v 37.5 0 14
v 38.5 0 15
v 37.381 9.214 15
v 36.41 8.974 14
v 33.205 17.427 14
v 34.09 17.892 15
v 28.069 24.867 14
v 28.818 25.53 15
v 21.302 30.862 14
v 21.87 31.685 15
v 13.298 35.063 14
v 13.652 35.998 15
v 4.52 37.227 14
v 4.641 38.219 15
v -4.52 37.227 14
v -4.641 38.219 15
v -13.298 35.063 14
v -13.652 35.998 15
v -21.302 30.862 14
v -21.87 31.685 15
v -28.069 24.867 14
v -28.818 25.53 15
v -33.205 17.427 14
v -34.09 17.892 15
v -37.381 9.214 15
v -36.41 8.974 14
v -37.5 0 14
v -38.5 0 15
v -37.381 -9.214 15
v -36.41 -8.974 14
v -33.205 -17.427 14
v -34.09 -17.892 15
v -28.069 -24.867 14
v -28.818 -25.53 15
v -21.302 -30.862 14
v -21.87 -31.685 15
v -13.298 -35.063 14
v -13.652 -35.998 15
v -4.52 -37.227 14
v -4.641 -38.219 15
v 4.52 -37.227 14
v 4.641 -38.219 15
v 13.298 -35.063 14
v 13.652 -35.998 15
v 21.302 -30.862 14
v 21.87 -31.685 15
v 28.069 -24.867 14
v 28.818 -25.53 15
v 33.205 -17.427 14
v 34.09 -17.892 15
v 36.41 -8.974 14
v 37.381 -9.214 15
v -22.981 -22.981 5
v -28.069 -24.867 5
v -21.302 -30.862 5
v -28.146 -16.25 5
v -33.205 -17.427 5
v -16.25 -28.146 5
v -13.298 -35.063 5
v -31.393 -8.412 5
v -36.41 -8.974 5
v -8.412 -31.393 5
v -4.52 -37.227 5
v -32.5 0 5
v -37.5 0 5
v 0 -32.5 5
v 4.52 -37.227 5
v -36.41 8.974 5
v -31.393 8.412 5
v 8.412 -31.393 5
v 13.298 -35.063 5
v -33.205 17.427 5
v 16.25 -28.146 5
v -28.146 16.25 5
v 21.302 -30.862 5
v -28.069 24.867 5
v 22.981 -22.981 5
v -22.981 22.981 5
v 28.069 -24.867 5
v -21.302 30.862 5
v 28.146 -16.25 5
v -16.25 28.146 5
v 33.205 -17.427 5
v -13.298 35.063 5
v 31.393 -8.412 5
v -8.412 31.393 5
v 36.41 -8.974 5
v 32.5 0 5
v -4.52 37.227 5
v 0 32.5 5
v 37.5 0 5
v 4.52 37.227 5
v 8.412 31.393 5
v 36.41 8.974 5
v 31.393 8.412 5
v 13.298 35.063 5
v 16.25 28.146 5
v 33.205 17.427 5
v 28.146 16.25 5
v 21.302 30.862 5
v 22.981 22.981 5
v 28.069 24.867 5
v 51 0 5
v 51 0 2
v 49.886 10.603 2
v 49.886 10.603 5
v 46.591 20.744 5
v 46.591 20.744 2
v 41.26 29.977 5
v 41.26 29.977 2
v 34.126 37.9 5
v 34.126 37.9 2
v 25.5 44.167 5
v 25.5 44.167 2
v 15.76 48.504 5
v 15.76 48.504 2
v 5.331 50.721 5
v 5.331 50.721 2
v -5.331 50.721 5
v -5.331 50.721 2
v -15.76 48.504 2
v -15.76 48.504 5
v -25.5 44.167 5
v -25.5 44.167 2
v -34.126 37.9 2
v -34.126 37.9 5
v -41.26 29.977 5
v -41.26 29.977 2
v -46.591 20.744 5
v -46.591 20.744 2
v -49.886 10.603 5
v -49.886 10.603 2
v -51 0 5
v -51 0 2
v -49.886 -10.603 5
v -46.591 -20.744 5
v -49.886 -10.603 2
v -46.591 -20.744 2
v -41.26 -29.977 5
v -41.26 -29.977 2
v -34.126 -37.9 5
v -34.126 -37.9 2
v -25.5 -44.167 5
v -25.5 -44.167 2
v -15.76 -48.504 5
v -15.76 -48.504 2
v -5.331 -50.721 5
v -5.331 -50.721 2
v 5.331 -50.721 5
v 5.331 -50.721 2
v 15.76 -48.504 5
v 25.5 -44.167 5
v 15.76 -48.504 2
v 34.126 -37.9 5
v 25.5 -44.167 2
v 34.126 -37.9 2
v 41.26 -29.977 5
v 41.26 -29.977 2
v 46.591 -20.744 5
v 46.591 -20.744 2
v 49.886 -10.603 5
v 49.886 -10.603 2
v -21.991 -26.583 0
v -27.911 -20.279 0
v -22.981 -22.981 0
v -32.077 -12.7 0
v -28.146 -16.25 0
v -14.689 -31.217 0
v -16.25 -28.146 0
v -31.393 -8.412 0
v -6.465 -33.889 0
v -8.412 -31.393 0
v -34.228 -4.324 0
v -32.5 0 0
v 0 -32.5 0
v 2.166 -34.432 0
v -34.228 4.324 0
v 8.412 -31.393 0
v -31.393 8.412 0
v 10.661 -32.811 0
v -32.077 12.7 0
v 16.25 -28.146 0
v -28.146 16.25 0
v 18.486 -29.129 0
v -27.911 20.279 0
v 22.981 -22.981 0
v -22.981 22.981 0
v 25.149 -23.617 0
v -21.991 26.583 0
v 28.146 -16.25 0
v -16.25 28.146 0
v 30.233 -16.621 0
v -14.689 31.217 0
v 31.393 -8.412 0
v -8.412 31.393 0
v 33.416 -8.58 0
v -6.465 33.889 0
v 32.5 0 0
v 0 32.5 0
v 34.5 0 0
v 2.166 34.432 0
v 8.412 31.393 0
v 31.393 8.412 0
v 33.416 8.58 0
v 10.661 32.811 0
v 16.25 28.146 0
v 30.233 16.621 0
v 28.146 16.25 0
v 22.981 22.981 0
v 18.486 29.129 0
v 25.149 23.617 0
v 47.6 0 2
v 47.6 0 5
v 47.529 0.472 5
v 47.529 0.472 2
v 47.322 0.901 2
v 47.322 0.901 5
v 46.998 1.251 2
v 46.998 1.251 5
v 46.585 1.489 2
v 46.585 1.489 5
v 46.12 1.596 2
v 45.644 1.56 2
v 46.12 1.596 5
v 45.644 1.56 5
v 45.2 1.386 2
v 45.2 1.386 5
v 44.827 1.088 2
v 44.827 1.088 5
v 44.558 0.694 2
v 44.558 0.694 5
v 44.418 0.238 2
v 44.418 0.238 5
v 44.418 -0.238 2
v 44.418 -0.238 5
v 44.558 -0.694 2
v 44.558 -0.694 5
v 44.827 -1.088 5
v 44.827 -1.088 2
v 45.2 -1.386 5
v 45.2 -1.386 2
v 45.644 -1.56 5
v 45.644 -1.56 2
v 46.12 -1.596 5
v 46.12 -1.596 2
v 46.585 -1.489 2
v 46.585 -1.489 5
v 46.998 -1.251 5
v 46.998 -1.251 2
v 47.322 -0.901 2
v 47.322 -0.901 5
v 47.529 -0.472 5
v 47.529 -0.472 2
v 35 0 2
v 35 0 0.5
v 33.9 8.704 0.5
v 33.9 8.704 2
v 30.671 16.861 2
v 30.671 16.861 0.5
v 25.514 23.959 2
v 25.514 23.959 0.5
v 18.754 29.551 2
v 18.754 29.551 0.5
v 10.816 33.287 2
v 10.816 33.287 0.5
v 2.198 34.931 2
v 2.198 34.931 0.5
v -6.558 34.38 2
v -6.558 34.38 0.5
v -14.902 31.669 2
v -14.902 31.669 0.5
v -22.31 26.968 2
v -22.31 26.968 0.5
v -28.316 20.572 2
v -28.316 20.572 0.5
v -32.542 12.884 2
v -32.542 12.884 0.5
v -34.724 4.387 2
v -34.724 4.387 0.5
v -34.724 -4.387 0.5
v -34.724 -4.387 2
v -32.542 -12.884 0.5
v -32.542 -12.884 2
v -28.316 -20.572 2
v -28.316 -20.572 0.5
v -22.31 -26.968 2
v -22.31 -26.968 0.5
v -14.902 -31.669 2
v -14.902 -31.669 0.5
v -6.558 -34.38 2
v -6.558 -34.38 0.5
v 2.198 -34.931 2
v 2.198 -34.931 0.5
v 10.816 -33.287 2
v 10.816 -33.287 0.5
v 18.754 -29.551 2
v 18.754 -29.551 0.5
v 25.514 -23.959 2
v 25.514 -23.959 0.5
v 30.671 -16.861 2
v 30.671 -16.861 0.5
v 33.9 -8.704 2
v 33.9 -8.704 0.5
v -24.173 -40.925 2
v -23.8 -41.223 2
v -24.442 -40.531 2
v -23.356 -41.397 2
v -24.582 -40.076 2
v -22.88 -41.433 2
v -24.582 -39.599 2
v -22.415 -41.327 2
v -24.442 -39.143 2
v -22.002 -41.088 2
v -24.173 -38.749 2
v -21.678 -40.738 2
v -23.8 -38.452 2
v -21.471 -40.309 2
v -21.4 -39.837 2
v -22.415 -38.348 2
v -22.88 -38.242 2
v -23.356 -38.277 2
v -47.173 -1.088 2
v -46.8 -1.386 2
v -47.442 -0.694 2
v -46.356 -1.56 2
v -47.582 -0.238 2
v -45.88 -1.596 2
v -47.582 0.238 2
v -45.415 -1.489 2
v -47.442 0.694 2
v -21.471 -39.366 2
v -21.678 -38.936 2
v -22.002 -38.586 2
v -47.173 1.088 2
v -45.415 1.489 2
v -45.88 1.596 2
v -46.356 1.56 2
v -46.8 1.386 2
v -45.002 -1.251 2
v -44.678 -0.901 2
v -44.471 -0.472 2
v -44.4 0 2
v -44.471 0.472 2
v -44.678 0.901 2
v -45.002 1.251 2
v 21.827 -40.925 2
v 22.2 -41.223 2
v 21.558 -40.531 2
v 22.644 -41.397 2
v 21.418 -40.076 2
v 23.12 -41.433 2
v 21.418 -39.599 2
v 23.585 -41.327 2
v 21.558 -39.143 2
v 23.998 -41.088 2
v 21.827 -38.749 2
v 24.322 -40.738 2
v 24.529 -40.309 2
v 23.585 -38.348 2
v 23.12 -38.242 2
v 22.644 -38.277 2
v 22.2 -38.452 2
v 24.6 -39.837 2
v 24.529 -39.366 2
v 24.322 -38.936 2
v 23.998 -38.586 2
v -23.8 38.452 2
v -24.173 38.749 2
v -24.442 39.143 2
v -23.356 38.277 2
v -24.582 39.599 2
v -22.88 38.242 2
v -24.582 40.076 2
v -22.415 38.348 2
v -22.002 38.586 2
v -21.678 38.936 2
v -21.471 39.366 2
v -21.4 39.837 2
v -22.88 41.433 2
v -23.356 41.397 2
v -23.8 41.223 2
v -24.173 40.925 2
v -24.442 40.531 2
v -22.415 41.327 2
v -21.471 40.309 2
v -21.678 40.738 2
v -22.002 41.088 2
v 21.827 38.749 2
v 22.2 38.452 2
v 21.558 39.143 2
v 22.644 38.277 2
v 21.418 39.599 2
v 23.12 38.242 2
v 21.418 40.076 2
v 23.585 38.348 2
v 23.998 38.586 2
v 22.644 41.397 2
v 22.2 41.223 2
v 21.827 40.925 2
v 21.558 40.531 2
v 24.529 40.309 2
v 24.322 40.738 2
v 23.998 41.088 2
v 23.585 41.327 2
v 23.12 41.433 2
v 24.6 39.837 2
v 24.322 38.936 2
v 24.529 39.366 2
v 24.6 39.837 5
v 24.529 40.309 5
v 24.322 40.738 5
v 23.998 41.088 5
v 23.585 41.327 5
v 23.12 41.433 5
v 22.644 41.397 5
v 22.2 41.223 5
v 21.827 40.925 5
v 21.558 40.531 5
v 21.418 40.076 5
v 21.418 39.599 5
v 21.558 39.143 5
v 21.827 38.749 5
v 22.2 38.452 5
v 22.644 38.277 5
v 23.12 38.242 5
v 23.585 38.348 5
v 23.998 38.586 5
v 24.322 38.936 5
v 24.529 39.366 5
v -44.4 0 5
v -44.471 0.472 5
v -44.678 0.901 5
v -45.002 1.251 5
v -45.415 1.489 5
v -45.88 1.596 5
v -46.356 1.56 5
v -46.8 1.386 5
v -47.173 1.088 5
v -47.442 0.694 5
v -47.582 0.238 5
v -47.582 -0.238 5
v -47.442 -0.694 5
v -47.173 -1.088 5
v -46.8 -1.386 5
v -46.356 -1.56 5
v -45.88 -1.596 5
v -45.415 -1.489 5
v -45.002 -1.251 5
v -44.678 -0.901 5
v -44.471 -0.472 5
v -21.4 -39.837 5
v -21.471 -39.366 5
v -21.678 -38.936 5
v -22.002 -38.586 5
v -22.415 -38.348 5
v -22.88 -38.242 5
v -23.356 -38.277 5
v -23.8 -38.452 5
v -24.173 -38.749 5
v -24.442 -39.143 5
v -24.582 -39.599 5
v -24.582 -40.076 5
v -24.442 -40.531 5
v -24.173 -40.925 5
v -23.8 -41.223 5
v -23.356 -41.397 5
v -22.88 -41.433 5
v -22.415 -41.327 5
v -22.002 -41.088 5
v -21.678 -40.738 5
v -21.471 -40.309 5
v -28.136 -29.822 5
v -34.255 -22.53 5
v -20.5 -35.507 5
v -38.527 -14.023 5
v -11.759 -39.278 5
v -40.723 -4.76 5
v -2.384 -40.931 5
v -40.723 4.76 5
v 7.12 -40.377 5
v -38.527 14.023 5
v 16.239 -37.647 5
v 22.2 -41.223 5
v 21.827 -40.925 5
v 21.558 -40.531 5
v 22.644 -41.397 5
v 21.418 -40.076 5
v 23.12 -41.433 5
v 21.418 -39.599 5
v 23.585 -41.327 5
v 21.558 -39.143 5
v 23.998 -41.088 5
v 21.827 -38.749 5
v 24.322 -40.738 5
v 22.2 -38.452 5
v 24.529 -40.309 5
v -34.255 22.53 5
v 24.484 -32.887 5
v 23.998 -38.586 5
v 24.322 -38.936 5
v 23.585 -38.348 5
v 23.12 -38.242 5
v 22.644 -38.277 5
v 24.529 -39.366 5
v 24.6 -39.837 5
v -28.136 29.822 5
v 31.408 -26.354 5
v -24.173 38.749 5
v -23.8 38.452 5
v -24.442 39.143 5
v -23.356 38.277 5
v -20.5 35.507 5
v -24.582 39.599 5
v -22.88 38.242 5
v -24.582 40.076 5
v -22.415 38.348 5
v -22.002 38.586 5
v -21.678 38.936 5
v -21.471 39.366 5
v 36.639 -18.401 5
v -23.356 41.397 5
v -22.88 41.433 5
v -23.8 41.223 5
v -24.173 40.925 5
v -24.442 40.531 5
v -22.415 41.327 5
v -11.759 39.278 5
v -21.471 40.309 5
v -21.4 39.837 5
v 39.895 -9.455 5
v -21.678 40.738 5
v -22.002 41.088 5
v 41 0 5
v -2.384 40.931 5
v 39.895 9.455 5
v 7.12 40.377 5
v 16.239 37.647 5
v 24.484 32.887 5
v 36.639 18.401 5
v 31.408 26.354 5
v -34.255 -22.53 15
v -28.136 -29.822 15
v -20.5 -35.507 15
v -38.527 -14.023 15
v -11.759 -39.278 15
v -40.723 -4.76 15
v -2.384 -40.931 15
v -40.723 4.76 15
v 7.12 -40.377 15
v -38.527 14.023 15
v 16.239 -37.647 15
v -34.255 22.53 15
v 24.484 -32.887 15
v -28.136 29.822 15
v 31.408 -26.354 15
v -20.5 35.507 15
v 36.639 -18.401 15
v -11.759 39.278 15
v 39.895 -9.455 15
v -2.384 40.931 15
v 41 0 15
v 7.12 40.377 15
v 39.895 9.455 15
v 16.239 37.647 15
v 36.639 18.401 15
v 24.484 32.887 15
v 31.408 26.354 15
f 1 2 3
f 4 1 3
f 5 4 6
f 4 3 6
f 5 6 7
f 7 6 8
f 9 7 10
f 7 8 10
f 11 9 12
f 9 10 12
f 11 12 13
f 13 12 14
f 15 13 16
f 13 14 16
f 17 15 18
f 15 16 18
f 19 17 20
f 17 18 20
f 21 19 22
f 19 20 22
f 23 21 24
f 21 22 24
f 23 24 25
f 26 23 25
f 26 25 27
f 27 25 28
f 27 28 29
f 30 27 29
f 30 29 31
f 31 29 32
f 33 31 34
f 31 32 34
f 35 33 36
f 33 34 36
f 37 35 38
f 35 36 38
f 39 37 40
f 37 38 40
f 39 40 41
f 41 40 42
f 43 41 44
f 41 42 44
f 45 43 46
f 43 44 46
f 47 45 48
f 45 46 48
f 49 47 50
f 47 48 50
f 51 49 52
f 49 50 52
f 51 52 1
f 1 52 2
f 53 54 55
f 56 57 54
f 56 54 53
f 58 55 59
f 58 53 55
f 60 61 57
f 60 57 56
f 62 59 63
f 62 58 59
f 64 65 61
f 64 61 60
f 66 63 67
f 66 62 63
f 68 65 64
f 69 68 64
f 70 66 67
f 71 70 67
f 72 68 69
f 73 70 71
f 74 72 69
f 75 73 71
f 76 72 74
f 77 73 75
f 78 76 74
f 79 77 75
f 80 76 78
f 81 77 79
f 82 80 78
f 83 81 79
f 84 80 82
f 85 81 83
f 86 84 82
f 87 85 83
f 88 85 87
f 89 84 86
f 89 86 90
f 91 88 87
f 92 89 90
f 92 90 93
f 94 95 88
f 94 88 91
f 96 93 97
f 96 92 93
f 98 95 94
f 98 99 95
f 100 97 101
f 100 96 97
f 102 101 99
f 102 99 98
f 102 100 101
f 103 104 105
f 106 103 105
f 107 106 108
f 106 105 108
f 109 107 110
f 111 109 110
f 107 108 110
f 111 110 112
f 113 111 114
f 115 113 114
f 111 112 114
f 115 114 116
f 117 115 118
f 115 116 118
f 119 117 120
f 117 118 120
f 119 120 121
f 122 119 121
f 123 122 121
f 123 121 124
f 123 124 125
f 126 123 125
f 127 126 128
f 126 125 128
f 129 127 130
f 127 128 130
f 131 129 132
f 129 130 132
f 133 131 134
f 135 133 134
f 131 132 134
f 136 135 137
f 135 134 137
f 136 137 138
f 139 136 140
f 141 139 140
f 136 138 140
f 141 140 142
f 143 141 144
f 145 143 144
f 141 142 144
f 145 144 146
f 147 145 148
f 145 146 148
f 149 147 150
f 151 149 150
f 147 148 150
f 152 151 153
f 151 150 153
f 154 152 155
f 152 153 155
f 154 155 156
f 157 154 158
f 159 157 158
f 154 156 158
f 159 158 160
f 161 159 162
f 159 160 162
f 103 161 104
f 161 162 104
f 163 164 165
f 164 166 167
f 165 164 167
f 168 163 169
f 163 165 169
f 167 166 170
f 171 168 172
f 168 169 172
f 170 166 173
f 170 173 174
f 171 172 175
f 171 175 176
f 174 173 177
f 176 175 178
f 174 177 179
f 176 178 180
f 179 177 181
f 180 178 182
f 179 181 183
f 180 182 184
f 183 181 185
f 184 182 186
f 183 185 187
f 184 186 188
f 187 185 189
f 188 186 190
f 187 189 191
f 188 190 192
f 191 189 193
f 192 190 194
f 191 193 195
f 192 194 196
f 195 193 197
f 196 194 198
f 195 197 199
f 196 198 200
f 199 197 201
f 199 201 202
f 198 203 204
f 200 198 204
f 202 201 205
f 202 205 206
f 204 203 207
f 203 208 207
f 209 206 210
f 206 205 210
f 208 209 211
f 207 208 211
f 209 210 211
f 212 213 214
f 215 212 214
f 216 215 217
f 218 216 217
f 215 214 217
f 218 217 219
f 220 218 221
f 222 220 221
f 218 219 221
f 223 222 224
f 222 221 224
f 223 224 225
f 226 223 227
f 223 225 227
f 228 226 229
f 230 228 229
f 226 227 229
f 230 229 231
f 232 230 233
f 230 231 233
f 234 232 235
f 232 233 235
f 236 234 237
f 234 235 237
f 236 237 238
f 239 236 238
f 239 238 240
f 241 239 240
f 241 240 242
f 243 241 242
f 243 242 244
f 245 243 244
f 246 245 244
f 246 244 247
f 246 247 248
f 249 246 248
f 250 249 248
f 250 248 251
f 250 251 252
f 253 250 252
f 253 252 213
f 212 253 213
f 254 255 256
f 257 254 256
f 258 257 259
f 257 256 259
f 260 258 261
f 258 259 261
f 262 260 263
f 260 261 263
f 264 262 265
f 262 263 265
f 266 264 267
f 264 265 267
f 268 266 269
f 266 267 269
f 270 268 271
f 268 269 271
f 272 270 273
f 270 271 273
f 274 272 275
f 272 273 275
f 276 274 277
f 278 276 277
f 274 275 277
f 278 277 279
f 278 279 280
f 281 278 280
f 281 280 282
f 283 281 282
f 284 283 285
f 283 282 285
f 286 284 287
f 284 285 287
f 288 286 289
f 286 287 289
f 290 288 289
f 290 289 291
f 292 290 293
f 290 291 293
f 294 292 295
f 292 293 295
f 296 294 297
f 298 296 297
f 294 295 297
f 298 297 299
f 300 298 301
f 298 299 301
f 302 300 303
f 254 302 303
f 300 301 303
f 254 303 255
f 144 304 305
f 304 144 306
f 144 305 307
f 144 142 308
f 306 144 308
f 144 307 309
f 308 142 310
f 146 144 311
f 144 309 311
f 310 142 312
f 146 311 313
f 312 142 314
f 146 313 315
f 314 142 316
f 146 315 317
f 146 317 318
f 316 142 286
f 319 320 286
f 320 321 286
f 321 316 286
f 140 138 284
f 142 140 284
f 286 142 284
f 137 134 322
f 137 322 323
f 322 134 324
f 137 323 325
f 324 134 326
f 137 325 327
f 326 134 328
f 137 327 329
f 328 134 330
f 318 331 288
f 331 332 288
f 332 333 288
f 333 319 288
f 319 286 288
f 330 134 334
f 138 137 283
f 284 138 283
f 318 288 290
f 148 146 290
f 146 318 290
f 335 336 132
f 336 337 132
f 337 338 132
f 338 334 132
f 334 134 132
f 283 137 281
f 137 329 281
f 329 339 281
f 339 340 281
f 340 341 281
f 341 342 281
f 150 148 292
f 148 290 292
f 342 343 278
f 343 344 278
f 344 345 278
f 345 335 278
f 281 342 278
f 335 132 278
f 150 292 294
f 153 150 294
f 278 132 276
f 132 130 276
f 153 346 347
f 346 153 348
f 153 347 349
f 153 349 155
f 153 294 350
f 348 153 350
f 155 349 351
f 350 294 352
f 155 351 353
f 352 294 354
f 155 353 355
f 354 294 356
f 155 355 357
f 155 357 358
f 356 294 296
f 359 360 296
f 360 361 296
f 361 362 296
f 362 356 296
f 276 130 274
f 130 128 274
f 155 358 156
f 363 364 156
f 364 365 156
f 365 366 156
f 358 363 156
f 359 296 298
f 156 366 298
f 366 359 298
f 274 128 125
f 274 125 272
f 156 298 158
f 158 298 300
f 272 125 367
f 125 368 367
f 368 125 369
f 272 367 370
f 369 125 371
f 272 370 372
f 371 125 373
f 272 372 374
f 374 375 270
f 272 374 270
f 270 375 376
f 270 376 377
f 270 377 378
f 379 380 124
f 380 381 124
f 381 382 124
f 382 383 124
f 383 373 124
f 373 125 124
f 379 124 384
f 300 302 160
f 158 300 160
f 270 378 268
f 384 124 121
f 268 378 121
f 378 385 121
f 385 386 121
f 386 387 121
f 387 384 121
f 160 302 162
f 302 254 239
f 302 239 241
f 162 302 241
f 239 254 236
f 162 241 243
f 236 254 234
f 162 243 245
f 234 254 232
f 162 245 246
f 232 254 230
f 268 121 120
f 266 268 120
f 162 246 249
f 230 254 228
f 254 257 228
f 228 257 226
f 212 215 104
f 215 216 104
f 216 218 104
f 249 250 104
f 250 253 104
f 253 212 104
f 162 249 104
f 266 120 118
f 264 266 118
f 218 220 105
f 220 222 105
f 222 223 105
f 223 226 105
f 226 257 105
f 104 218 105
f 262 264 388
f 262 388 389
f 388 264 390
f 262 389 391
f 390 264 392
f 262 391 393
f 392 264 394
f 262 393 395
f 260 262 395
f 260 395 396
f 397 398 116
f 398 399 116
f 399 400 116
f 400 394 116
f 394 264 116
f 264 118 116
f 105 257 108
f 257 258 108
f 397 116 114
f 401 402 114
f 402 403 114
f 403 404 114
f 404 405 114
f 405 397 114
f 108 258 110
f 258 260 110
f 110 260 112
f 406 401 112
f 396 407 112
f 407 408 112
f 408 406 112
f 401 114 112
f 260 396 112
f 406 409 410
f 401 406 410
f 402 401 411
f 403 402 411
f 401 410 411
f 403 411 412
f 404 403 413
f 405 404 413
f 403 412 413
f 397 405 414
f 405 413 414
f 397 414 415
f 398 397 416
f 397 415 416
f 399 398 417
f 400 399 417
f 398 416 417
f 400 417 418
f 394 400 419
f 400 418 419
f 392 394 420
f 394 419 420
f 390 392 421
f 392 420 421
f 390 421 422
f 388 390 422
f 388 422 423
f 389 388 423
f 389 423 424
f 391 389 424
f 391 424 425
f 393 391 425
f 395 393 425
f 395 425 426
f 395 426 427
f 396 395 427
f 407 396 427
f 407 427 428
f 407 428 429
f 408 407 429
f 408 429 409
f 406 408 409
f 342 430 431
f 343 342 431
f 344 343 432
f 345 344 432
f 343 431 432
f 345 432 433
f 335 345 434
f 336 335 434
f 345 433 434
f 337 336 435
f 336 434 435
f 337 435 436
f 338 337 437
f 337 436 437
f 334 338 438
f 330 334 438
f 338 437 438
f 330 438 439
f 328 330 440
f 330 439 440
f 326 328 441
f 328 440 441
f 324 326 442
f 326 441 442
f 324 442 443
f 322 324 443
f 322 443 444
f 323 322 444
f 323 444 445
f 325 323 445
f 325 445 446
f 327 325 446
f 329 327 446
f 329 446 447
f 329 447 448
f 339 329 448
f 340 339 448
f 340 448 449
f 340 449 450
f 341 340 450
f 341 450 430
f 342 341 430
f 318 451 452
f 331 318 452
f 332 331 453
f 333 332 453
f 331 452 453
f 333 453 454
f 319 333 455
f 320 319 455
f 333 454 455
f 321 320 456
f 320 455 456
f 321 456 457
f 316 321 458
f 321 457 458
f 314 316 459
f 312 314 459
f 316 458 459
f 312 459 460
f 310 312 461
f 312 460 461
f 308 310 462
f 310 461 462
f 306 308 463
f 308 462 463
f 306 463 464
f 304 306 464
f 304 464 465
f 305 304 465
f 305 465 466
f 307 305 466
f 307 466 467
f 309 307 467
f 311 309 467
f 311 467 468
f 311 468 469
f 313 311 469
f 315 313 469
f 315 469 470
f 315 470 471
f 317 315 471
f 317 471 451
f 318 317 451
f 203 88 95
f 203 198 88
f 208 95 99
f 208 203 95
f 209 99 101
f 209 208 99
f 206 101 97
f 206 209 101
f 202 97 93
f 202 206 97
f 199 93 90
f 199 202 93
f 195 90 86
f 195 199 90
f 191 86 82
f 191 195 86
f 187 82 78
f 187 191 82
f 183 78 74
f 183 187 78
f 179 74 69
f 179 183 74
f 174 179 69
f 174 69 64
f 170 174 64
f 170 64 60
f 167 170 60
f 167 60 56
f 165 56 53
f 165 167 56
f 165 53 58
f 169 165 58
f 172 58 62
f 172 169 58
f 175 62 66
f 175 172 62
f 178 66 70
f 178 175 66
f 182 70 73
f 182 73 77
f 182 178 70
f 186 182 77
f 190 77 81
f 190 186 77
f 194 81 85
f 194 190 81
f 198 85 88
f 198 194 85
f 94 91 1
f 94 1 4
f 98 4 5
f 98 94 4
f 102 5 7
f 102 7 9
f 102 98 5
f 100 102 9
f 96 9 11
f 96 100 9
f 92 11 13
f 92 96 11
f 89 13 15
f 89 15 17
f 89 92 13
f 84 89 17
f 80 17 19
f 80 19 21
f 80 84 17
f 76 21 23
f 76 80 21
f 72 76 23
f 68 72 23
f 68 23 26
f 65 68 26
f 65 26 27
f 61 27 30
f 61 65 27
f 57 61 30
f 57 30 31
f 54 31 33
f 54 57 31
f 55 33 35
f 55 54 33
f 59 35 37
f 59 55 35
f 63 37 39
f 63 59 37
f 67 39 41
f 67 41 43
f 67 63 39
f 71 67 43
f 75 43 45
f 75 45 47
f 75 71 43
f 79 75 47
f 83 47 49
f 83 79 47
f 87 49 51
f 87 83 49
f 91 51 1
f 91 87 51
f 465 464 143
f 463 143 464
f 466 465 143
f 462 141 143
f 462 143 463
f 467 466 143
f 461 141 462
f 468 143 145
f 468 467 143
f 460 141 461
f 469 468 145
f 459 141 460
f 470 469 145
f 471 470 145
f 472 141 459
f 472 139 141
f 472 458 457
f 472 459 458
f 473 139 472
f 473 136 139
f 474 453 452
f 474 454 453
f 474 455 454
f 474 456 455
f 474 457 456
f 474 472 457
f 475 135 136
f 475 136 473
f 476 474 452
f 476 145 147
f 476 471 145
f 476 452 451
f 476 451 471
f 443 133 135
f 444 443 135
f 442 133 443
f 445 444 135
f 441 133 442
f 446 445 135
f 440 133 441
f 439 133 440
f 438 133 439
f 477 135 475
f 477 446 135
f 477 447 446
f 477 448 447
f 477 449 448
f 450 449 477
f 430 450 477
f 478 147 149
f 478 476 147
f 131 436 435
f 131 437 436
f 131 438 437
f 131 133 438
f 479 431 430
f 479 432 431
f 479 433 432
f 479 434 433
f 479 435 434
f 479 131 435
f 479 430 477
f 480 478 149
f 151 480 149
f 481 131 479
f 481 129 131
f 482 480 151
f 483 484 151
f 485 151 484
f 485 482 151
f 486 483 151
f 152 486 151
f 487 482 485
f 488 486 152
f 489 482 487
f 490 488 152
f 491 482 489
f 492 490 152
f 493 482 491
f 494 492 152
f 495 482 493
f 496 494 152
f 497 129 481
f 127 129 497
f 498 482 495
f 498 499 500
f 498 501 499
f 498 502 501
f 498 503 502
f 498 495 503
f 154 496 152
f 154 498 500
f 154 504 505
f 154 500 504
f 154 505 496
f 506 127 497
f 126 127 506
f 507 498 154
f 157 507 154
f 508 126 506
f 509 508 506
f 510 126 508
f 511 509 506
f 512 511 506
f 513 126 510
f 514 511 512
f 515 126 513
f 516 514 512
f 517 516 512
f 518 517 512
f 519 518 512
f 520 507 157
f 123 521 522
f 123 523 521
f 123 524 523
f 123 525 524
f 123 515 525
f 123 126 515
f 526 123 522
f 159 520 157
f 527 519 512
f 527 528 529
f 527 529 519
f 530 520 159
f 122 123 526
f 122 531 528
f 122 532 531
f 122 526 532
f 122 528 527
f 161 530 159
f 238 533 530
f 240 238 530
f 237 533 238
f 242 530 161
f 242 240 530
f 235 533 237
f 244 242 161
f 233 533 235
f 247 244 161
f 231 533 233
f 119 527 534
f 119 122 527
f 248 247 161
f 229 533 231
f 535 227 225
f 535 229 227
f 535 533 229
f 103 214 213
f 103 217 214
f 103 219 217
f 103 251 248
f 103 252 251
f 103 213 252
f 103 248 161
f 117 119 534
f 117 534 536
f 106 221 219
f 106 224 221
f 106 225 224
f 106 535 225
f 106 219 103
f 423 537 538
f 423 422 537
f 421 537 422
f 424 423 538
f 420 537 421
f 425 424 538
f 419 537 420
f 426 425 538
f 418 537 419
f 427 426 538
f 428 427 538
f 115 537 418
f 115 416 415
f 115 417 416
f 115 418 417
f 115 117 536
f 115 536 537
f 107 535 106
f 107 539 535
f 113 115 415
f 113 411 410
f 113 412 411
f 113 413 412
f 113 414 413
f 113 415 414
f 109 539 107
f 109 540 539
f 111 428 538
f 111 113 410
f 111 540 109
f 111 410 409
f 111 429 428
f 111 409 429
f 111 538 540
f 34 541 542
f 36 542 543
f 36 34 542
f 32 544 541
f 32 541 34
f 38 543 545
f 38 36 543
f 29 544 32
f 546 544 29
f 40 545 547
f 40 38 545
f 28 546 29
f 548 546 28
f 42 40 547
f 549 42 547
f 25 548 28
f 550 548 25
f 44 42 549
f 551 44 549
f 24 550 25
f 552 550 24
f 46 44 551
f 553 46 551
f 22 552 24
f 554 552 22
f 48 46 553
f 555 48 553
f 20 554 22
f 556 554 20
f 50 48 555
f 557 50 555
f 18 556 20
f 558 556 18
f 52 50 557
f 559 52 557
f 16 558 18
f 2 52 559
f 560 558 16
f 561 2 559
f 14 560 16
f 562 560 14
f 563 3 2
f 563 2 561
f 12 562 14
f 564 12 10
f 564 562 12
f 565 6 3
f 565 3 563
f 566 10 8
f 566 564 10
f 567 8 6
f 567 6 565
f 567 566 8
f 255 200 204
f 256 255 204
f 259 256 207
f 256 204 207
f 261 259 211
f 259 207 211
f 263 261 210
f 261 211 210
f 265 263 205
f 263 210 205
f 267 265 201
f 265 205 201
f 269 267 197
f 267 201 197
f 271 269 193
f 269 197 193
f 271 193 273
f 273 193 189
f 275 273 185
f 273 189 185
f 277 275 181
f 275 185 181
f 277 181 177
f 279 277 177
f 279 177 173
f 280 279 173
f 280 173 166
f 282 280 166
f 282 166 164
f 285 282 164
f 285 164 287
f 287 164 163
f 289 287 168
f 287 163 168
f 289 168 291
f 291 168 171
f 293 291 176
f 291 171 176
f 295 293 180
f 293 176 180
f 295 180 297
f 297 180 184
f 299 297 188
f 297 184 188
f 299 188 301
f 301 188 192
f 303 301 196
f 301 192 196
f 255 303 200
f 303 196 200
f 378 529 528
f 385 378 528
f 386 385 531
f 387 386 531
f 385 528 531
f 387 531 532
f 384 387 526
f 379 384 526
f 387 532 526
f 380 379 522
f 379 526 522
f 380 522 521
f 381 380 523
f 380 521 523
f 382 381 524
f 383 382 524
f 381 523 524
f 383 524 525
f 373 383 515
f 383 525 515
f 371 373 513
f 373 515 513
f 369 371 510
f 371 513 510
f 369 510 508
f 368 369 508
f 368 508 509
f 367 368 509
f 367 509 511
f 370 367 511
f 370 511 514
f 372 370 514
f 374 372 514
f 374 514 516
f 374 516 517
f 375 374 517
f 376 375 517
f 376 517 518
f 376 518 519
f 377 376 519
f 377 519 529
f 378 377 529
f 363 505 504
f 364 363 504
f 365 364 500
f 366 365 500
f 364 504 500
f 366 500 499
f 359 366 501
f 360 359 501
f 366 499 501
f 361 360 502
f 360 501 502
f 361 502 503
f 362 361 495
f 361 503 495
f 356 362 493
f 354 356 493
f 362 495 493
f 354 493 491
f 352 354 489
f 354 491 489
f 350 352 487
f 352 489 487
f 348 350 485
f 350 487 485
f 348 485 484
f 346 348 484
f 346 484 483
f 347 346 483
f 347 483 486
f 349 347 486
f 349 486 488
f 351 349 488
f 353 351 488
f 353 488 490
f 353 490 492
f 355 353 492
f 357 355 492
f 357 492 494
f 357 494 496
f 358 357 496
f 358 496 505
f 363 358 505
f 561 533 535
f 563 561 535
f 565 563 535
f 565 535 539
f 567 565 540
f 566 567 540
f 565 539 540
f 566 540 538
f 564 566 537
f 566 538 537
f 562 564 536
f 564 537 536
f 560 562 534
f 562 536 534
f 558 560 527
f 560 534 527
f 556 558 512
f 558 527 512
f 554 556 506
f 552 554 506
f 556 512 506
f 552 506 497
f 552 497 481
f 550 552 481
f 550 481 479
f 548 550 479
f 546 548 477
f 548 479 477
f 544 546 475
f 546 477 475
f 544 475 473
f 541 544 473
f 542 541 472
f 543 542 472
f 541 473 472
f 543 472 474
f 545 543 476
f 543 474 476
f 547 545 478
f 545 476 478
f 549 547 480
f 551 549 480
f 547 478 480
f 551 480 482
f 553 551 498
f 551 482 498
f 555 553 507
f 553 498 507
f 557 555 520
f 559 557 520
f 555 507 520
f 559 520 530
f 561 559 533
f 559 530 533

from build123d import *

# Parameters (mm, degrees)
SKETCH_R        = 35
SKETCH_R_2      = 32.5
PAD_DEPTH       = 2
SKETCH001_R     = 51
SKETCH001_R_2   = 32.5
PAD001_DEPTH    = 3
SKETCH002_R     = 41
SKETCH002_R_2   = 37.5
PAD002_DEPTH    = 10
SKETCH003_R     = 1.6
POCKET_DEPTH    = 5.001
CHAMFER_SIZE    = 0.5
CHAMFER001_SIZE = 1


with BuildPart() as part:
    # Sketch → Pad (new body)
    with BuildSketch(Plane.XY):
        Circle(SKETCH_R)
        Circle(SKETCH_R_2, mode=Mode.SUBTRACT)
    extrude(amount=PAD_DEPTH)

    # Sketch001 (on Face4 of Pad) → Pad001 (join)
    with BuildSketch(Plane.XY.offset(2)):
        Circle(SKETCH001_R)
        Circle(SKETCH001_R_2, mode=Mode.SUBTRACT)
    extrude(amount=PAD001_DEPTH)

    # Sketch002 (on Face7 of Pad001) → Pad002 (join)
    with BuildSketch(Plane.XY.offset(5)):
        Circle(SKETCH002_R)
        Circle(SKETCH002_R_2, mode=Mode.SUBTRACT)
    extrude(amount=PAD002_DEPTH)

    # Sketch003 (on Face7 of Pad002) → Pocket (cut, through all)
    with BuildSketch(Plane.XY.offset(5)):
        with Locations((-23, 39.837169)):
            Circle(SKETCH003_R)
        with Locations((23, 39.837169)):
            Circle(SKETCH003_R)
        with Locations((46, 0)):
            Circle(SKETCH003_R)
        with Locations((23, -39.837169)):
            Circle(SKETCH003_R)
        with Locations((-23, -39.837169)):
            Circle(SKETCH003_R)
        with Locations((-46, 0)):
            Circle(SKETCH003_R)
    extrude(amount=-POCKET_DEPTH, mode=Mode.SUBTRACT)

    # Chamfer
    chamfer_edges = [part.edges().sort_by_distance(p)[0] for p in [
        (-35, 0, 0),
    ]]
    chamfer(chamfer_edges, length=CHAMFER_SIZE)

    # Chamfer001
    chamfer001_edges = [part.edges().sort_by_distance(p)[0] for p in [
        (-37.5, 0, 15),
    ]]
    chamfer(chamfer001_edges, length=CHAMFER001_SIZE)


solid = part.part
